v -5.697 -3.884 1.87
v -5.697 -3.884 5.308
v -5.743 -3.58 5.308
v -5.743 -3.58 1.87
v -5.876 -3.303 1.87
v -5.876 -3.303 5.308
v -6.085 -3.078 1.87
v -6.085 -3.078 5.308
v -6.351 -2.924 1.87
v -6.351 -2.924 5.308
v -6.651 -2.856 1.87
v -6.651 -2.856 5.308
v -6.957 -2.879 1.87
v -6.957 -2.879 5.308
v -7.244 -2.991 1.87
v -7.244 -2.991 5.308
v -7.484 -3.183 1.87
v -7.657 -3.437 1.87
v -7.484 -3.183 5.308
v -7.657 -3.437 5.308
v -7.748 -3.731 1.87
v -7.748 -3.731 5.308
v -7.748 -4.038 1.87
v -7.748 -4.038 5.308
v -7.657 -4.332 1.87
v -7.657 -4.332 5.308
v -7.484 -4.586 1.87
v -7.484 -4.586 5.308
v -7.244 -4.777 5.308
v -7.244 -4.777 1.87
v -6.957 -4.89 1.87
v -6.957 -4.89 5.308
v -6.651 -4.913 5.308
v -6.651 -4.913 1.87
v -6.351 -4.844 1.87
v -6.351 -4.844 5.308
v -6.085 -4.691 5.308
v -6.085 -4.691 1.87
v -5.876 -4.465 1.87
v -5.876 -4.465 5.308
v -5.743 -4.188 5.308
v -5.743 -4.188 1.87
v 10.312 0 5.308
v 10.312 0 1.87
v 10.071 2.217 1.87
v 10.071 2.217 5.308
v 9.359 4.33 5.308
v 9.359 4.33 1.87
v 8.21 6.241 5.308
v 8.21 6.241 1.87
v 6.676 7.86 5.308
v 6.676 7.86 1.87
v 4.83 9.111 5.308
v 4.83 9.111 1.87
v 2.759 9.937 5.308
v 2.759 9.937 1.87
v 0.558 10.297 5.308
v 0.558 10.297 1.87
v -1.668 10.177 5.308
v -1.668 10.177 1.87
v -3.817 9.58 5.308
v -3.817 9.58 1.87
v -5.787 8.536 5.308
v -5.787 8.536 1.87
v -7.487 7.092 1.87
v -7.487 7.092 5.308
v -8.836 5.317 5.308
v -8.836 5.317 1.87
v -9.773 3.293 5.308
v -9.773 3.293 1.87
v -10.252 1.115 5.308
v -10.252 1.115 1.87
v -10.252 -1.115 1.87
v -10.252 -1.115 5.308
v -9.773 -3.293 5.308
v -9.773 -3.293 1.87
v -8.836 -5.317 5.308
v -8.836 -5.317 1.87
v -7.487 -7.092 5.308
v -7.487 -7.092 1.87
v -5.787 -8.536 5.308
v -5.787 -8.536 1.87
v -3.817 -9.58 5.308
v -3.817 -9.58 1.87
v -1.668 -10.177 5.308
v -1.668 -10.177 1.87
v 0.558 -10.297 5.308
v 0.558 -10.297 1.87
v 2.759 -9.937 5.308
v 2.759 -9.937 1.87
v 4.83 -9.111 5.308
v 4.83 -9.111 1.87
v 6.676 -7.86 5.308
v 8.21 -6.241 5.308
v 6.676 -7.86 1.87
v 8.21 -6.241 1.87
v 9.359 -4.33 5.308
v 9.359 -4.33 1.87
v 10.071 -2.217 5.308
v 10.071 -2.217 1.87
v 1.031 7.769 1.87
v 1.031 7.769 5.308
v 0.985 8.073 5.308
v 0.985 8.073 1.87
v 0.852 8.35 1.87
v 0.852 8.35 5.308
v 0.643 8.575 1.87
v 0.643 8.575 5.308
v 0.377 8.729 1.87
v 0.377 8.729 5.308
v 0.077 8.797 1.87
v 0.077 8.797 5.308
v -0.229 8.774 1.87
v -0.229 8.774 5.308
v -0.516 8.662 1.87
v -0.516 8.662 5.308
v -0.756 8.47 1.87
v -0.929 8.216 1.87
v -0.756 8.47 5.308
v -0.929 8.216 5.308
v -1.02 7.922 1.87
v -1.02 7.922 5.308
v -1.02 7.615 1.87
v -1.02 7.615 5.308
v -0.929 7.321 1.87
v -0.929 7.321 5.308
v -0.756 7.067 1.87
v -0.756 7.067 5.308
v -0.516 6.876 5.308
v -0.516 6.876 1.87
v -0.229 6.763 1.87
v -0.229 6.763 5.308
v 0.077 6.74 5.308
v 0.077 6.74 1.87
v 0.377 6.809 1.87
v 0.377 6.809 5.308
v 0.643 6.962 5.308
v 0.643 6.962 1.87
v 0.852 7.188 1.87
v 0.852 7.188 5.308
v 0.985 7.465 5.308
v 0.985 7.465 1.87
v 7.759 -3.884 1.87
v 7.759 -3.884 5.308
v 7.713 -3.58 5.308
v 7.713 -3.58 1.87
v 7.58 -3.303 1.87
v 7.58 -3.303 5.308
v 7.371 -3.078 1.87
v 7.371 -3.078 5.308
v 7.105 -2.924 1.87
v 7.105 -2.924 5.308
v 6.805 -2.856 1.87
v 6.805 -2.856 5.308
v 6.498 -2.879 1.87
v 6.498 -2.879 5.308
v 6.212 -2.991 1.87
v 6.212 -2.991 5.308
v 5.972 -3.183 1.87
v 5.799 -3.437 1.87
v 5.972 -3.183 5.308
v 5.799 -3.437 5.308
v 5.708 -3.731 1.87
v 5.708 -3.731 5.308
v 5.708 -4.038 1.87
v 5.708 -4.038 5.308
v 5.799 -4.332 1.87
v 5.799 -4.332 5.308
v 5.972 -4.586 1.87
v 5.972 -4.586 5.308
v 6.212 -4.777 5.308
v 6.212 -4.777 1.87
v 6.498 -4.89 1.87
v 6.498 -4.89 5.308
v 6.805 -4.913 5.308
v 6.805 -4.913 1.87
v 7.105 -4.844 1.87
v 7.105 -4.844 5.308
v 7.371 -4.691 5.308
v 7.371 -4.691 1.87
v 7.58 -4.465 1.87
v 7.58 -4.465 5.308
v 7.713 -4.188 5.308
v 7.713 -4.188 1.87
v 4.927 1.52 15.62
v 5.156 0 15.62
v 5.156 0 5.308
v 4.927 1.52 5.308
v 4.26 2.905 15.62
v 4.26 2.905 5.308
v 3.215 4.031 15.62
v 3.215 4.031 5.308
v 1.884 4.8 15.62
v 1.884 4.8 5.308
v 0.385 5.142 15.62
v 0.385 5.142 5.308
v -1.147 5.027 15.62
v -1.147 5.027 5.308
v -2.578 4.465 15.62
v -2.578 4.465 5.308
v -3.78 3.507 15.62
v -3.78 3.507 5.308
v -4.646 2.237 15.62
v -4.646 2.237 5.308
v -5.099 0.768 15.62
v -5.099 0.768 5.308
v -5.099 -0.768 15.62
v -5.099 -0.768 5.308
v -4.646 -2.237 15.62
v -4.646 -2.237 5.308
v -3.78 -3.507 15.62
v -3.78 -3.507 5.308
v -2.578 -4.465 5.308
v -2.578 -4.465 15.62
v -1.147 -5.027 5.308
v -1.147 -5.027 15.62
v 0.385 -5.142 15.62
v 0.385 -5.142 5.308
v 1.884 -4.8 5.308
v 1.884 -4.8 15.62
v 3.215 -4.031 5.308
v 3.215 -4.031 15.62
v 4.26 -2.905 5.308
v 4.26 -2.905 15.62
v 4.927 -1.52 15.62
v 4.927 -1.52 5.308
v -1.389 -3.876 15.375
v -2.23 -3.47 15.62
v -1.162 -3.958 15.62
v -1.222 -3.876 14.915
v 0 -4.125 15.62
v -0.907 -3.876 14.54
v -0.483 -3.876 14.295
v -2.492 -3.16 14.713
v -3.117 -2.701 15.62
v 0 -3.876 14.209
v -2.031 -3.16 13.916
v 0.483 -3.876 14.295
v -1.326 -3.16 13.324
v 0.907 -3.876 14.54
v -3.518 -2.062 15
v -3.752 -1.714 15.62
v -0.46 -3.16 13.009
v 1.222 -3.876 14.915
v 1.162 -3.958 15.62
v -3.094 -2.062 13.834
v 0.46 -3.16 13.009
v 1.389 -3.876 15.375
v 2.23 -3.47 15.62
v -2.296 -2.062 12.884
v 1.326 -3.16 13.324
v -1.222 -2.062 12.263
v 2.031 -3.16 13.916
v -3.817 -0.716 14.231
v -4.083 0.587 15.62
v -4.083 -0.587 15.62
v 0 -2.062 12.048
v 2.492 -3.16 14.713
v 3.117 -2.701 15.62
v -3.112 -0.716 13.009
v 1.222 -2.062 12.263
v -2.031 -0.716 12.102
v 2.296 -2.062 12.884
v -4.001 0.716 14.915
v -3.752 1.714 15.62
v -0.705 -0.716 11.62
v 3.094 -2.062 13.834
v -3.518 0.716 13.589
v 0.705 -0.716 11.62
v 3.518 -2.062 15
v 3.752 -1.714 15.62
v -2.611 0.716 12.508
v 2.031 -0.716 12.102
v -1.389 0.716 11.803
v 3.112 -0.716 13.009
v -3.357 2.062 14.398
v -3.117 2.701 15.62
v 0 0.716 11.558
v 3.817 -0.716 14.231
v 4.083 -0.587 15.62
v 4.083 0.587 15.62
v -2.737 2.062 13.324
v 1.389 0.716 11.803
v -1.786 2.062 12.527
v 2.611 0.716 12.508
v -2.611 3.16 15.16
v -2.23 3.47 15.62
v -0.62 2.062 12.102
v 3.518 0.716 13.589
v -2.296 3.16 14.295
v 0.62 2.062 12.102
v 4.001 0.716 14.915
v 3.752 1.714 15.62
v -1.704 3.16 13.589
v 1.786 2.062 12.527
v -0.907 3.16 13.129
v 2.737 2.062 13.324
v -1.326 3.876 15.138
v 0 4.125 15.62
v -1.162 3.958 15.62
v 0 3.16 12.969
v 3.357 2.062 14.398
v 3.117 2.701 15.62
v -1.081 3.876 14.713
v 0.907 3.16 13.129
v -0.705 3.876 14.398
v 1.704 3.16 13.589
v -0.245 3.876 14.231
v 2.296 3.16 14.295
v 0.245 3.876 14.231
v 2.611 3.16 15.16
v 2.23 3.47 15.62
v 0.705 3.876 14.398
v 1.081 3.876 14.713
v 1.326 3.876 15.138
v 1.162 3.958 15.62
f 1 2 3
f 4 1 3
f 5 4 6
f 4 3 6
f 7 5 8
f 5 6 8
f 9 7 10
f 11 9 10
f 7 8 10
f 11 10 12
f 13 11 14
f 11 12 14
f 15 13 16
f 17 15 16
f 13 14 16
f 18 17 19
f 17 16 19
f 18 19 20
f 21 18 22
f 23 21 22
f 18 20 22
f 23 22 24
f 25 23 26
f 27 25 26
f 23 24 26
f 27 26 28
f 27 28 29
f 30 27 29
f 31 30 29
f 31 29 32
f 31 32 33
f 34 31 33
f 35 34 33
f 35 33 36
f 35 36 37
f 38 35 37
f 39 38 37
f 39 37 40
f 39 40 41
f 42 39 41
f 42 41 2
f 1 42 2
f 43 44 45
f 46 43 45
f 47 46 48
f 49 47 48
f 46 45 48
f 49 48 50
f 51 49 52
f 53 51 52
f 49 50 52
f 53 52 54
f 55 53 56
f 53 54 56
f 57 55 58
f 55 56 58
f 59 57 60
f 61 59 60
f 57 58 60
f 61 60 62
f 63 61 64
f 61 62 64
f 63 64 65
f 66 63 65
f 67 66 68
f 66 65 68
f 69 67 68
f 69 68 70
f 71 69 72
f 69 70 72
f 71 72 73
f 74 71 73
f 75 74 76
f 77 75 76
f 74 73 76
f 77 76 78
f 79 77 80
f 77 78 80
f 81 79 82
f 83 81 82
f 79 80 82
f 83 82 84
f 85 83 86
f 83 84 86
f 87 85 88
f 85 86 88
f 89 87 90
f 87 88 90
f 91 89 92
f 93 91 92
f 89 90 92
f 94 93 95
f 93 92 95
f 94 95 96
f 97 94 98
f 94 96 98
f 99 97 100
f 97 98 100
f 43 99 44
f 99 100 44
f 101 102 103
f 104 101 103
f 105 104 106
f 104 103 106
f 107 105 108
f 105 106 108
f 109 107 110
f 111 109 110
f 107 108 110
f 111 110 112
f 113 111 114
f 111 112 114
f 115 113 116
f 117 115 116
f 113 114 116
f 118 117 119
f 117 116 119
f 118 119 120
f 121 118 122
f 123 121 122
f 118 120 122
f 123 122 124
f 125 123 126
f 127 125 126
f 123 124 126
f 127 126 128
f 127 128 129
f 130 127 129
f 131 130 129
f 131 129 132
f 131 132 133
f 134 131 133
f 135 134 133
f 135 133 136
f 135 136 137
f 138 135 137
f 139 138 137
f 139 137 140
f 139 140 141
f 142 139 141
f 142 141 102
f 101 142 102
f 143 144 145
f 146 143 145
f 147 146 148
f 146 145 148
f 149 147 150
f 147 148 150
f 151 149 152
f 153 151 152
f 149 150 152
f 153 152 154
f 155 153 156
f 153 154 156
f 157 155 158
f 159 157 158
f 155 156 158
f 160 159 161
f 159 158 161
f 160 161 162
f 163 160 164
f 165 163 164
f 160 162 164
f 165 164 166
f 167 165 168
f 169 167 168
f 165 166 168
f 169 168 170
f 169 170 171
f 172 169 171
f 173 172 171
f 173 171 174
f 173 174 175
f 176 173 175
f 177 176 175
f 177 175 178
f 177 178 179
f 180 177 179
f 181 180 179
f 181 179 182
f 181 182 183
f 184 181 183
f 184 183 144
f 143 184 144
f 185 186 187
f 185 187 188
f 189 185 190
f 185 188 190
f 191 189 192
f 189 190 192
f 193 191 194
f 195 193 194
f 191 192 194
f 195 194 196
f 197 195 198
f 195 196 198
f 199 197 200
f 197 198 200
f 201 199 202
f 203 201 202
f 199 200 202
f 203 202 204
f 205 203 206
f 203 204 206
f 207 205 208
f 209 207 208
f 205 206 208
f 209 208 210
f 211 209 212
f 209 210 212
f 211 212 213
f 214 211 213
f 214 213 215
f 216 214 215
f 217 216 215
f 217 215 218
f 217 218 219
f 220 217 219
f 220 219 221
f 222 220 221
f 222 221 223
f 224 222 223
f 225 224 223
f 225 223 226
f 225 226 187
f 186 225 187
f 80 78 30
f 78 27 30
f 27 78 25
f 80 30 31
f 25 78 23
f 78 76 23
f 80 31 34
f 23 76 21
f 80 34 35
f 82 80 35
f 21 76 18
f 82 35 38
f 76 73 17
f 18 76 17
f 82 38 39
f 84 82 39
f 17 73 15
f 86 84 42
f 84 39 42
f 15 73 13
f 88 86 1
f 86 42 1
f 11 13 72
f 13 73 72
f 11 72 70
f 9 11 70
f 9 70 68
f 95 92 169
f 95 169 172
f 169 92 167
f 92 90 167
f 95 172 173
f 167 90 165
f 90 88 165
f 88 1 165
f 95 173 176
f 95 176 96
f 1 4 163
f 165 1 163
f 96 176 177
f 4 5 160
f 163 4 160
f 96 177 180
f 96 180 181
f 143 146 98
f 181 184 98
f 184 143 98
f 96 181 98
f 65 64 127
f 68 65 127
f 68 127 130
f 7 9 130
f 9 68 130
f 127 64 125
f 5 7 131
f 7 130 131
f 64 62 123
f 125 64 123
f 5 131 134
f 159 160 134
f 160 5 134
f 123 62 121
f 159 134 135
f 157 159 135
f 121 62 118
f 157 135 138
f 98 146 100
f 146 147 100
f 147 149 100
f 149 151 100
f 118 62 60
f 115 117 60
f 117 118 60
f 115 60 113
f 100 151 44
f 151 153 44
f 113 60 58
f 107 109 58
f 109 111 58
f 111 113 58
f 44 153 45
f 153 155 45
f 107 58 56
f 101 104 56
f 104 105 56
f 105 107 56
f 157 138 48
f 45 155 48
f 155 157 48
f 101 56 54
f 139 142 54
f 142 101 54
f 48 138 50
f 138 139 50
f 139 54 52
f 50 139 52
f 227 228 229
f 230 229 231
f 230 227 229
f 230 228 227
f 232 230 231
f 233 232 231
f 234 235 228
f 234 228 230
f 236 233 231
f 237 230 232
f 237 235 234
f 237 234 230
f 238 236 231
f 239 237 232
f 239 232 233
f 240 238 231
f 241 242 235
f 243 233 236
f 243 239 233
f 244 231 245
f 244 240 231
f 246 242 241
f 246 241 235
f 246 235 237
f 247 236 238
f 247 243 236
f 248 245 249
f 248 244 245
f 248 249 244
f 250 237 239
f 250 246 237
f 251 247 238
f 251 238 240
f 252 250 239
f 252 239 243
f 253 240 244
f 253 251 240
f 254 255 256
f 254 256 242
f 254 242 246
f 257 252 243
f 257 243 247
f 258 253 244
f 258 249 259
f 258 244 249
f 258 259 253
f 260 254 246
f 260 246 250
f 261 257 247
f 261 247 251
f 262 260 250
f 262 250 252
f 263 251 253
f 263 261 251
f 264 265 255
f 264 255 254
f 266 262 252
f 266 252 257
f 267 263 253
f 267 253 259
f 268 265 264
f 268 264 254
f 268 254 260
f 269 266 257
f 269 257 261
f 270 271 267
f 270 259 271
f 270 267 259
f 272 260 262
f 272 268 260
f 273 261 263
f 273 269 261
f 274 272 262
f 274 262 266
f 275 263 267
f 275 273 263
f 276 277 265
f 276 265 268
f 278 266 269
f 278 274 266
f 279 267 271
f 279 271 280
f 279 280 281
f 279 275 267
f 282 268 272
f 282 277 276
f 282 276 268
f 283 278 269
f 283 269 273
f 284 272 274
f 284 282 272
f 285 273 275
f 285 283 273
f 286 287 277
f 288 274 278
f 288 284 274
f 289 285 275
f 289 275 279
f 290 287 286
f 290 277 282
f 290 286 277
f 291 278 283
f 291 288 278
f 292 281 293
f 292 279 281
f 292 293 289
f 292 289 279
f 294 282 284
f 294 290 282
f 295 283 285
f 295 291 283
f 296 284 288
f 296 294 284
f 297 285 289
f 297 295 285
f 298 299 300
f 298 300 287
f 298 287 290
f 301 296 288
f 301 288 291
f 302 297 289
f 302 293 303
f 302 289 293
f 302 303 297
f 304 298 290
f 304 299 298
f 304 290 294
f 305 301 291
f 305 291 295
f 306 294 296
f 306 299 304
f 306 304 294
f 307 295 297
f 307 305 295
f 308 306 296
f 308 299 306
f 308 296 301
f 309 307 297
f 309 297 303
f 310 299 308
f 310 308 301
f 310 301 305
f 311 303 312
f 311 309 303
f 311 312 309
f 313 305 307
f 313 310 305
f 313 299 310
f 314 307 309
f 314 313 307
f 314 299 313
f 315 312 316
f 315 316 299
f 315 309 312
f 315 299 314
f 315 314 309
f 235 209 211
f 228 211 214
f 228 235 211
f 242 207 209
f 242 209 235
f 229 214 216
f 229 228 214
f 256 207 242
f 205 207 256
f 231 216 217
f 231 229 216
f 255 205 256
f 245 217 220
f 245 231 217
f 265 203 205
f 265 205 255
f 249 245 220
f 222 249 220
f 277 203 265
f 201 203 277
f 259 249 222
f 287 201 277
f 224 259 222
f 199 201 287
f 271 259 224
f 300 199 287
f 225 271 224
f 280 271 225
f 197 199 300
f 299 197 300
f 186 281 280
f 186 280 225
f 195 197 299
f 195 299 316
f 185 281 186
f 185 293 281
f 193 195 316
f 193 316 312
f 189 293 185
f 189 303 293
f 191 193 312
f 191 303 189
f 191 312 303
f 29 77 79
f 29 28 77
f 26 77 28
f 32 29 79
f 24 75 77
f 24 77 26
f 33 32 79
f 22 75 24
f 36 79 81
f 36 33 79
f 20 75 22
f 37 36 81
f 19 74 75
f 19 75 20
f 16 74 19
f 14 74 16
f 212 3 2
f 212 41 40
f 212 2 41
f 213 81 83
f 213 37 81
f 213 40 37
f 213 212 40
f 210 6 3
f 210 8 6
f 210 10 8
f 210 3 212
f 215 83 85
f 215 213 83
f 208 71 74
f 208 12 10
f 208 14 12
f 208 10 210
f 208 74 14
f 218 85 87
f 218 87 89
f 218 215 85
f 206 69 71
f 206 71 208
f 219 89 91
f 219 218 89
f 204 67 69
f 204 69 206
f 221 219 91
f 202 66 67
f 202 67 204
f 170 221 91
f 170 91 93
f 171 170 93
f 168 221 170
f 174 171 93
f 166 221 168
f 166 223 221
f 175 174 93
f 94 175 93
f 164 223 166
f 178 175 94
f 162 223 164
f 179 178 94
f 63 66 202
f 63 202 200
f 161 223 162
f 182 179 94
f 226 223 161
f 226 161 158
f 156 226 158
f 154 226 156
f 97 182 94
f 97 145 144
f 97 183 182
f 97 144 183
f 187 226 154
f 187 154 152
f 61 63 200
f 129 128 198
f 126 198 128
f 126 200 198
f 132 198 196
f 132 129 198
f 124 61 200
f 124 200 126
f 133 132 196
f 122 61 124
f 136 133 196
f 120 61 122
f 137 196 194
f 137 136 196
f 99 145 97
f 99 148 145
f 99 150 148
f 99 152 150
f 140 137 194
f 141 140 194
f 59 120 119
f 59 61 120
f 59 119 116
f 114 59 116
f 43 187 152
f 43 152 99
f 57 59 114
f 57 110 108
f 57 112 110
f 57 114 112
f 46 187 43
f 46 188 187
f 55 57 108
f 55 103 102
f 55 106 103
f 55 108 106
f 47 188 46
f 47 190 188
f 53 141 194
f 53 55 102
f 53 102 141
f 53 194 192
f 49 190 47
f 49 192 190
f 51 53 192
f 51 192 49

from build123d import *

# Parameters (mm, degrees)
SKETCH1_R           = 7.5
SKETCH1_R_2         = 6
BOSS_EXTRUDE1_DEPTH = 20
SKETCH1_4_R         = 6
BOSS_EXTRUDE2_DEPTH = 20
SKETCH1_5_R         = 15
SKETCH1_5_R_2       = 7.5
BOSS_EXTRUDE3_DEPTH = 5
SKETCH3_R           = 1.5
CUT_EXTRUDE1_DEPTH  = 11
SCALE1_SCALE        = 0.5
SCALE2_SCALE        = 1.25
SCALE3_SCALE        = 1.1


with BuildPart() as part:
    # Sketch1 → Boss-Extrude1 (new body)
    with BuildSketch(Plane.XY):
        Circle(SKETCH1_R)
        Circle(SKETCH1_R_2, mode=Mode.SUBTRACT)
    extrude(amount=BOSS_EXTRUDE1_DEPTH)

    # Sketch1<4> → Boss-Extrude2 (add)
    with BuildSketch(Plane.XY):
        Circle(SKETCH1_4_R)
    extrude(amount=BOSS_EXTRUDE2_DEPTH)

    # Sketch1<5> → Boss-Extrude3 (add)
    with BuildSketch(Plane.XY):
        Circle(SKETCH1_5_R)
        Circle(SKETCH1_5_R_2, mode=Mode.SUBTRACT)
    extrude(amount=BOSS_EXTRUDE3_DEPTH)

    # Sketch2 → Cut-Revolve1 (revolve, cut)
    with BuildSketch(Plane.XY.offset(20)):
        with BuildLine():
            Line((0, 6), (0, -6))
            ThreePointArc((0, -6), (6, 0), (0, 6))
        make_face()
    revolve(axis=Axis((0, 13.785304087, 20), (0, -1, 0)), mode=Mode.SUBTRACT)

    # Sketch3 → Cut-Extrude1 (cut)
    with BuildSketch(Plane.XY.offset(5)):
        with Locations((0, 11.3)):
            Circle(SKETCH3_R)
        with Locations((9.786087063, -5.65)):
            Circle(SKETCH3_R)
        with Locations((-9.786087063, -5.65)):
            Circle(SKETCH3_R)
    extrude(amount=-CUT_EXTRUDE1_DEPTH, mode=Mode.SUBTRACT)


with BuildPart() as part_1:
    # Scale1: scaled about (0, 0, 5.984924623)
    add(part.part.scale(SCALE1_SCALE).moved(Location((0, 0, 2.992462312))))


with BuildPart() as part_2:
    # Scale2: scaled about (0, 0, 5.984924623)
    add(part_1.part.scale(SCALE2_SCALE).moved(Location((0, 0, -1.496231156))))


with BuildPart() as part_3:
    # Scale3: scaled about (0, 0, 5.984924623)
    add(part_2.part.scale(SCALE3_SCALE).moved(Location((0, 0, -0.598492462))))


solid = part_3.part
